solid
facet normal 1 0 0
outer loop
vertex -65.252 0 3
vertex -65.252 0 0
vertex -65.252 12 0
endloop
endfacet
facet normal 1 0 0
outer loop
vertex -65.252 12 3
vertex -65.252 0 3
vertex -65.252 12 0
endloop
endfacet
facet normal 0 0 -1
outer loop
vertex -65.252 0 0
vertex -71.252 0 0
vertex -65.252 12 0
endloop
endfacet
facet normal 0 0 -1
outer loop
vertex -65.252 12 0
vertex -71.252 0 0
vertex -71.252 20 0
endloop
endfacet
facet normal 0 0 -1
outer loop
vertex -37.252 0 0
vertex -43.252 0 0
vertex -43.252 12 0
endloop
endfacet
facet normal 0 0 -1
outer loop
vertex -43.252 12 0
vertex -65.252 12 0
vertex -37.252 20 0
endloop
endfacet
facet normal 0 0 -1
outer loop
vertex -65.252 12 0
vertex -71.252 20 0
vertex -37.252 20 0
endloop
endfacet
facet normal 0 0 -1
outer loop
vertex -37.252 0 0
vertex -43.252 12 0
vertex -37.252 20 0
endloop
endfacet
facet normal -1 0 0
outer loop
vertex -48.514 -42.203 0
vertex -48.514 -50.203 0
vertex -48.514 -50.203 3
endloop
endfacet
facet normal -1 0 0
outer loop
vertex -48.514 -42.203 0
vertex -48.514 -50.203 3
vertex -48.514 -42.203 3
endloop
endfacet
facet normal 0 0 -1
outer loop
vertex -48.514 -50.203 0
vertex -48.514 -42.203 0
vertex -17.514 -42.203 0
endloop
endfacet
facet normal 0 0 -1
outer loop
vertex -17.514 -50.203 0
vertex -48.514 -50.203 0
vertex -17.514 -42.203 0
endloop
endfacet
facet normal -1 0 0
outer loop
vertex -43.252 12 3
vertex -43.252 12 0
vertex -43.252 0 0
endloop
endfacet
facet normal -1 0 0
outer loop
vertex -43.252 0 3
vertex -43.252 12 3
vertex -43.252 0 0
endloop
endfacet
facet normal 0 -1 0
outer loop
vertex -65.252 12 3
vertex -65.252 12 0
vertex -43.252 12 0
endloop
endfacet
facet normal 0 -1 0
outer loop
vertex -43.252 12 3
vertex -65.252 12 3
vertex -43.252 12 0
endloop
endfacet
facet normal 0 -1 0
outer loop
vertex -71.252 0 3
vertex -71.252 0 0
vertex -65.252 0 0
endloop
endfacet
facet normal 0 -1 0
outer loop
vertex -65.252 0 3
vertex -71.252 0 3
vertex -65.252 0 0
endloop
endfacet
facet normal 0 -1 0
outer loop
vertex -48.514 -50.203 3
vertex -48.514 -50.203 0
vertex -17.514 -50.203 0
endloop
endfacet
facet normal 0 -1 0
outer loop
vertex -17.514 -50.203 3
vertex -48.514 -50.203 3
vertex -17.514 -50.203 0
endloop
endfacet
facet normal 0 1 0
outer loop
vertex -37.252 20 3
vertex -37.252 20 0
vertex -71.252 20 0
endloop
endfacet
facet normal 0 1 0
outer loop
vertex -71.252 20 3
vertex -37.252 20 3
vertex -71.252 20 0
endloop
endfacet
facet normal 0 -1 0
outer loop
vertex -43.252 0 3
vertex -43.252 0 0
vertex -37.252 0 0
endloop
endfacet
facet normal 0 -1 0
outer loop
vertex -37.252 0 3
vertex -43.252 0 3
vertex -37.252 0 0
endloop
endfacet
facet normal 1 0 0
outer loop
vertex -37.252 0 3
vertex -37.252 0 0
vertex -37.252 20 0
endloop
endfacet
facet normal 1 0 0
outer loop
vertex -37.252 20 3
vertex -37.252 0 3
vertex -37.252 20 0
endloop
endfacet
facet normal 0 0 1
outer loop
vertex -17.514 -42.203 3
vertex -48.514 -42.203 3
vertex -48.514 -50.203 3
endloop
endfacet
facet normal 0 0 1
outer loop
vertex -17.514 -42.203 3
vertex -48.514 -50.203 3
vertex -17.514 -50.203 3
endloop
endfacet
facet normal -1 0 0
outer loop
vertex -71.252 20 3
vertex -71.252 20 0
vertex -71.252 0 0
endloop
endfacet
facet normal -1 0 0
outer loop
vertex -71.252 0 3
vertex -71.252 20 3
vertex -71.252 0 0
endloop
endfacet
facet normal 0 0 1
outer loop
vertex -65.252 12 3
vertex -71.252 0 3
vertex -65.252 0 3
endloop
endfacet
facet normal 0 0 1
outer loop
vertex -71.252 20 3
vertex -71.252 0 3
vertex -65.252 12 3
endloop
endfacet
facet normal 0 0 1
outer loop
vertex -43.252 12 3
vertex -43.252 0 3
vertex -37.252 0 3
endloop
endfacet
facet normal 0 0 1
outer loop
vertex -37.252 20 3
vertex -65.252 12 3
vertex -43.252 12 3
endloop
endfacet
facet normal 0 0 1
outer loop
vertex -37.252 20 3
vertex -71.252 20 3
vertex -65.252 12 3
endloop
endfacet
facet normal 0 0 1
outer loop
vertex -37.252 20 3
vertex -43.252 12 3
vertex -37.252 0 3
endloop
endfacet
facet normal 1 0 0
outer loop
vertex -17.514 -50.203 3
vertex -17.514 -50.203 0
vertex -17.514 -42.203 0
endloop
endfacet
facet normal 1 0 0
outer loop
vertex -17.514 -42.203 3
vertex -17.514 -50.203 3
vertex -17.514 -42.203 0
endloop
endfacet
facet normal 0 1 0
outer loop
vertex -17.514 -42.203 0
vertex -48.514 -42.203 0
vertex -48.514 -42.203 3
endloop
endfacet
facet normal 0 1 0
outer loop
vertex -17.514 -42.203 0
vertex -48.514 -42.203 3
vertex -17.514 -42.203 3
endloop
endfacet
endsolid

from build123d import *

# Parameters (mm, degrees)
F0_W     = 31
F0_H     = 8
F1_DEPTH = 3


with BuildPart() as f1:
    # F0 (on Top) → F1 (new body)
    with BuildSketch(Plane.XY):
        Polygon((-37.2518, 20), (-71.2518, 20), (-71.2518, 0), (-70.2518, 0), (-65.2518, 0), (-65.2518, 12), (-43.2518, 12), (-43.2518, 0), (-37.2518, 0), align=None)
        with Locations((-33.013606, -46.202545)):
            Rectangle(F0_W, F0_H)
    extrude(amount=F1_DEPTH)


solid = f1.part
